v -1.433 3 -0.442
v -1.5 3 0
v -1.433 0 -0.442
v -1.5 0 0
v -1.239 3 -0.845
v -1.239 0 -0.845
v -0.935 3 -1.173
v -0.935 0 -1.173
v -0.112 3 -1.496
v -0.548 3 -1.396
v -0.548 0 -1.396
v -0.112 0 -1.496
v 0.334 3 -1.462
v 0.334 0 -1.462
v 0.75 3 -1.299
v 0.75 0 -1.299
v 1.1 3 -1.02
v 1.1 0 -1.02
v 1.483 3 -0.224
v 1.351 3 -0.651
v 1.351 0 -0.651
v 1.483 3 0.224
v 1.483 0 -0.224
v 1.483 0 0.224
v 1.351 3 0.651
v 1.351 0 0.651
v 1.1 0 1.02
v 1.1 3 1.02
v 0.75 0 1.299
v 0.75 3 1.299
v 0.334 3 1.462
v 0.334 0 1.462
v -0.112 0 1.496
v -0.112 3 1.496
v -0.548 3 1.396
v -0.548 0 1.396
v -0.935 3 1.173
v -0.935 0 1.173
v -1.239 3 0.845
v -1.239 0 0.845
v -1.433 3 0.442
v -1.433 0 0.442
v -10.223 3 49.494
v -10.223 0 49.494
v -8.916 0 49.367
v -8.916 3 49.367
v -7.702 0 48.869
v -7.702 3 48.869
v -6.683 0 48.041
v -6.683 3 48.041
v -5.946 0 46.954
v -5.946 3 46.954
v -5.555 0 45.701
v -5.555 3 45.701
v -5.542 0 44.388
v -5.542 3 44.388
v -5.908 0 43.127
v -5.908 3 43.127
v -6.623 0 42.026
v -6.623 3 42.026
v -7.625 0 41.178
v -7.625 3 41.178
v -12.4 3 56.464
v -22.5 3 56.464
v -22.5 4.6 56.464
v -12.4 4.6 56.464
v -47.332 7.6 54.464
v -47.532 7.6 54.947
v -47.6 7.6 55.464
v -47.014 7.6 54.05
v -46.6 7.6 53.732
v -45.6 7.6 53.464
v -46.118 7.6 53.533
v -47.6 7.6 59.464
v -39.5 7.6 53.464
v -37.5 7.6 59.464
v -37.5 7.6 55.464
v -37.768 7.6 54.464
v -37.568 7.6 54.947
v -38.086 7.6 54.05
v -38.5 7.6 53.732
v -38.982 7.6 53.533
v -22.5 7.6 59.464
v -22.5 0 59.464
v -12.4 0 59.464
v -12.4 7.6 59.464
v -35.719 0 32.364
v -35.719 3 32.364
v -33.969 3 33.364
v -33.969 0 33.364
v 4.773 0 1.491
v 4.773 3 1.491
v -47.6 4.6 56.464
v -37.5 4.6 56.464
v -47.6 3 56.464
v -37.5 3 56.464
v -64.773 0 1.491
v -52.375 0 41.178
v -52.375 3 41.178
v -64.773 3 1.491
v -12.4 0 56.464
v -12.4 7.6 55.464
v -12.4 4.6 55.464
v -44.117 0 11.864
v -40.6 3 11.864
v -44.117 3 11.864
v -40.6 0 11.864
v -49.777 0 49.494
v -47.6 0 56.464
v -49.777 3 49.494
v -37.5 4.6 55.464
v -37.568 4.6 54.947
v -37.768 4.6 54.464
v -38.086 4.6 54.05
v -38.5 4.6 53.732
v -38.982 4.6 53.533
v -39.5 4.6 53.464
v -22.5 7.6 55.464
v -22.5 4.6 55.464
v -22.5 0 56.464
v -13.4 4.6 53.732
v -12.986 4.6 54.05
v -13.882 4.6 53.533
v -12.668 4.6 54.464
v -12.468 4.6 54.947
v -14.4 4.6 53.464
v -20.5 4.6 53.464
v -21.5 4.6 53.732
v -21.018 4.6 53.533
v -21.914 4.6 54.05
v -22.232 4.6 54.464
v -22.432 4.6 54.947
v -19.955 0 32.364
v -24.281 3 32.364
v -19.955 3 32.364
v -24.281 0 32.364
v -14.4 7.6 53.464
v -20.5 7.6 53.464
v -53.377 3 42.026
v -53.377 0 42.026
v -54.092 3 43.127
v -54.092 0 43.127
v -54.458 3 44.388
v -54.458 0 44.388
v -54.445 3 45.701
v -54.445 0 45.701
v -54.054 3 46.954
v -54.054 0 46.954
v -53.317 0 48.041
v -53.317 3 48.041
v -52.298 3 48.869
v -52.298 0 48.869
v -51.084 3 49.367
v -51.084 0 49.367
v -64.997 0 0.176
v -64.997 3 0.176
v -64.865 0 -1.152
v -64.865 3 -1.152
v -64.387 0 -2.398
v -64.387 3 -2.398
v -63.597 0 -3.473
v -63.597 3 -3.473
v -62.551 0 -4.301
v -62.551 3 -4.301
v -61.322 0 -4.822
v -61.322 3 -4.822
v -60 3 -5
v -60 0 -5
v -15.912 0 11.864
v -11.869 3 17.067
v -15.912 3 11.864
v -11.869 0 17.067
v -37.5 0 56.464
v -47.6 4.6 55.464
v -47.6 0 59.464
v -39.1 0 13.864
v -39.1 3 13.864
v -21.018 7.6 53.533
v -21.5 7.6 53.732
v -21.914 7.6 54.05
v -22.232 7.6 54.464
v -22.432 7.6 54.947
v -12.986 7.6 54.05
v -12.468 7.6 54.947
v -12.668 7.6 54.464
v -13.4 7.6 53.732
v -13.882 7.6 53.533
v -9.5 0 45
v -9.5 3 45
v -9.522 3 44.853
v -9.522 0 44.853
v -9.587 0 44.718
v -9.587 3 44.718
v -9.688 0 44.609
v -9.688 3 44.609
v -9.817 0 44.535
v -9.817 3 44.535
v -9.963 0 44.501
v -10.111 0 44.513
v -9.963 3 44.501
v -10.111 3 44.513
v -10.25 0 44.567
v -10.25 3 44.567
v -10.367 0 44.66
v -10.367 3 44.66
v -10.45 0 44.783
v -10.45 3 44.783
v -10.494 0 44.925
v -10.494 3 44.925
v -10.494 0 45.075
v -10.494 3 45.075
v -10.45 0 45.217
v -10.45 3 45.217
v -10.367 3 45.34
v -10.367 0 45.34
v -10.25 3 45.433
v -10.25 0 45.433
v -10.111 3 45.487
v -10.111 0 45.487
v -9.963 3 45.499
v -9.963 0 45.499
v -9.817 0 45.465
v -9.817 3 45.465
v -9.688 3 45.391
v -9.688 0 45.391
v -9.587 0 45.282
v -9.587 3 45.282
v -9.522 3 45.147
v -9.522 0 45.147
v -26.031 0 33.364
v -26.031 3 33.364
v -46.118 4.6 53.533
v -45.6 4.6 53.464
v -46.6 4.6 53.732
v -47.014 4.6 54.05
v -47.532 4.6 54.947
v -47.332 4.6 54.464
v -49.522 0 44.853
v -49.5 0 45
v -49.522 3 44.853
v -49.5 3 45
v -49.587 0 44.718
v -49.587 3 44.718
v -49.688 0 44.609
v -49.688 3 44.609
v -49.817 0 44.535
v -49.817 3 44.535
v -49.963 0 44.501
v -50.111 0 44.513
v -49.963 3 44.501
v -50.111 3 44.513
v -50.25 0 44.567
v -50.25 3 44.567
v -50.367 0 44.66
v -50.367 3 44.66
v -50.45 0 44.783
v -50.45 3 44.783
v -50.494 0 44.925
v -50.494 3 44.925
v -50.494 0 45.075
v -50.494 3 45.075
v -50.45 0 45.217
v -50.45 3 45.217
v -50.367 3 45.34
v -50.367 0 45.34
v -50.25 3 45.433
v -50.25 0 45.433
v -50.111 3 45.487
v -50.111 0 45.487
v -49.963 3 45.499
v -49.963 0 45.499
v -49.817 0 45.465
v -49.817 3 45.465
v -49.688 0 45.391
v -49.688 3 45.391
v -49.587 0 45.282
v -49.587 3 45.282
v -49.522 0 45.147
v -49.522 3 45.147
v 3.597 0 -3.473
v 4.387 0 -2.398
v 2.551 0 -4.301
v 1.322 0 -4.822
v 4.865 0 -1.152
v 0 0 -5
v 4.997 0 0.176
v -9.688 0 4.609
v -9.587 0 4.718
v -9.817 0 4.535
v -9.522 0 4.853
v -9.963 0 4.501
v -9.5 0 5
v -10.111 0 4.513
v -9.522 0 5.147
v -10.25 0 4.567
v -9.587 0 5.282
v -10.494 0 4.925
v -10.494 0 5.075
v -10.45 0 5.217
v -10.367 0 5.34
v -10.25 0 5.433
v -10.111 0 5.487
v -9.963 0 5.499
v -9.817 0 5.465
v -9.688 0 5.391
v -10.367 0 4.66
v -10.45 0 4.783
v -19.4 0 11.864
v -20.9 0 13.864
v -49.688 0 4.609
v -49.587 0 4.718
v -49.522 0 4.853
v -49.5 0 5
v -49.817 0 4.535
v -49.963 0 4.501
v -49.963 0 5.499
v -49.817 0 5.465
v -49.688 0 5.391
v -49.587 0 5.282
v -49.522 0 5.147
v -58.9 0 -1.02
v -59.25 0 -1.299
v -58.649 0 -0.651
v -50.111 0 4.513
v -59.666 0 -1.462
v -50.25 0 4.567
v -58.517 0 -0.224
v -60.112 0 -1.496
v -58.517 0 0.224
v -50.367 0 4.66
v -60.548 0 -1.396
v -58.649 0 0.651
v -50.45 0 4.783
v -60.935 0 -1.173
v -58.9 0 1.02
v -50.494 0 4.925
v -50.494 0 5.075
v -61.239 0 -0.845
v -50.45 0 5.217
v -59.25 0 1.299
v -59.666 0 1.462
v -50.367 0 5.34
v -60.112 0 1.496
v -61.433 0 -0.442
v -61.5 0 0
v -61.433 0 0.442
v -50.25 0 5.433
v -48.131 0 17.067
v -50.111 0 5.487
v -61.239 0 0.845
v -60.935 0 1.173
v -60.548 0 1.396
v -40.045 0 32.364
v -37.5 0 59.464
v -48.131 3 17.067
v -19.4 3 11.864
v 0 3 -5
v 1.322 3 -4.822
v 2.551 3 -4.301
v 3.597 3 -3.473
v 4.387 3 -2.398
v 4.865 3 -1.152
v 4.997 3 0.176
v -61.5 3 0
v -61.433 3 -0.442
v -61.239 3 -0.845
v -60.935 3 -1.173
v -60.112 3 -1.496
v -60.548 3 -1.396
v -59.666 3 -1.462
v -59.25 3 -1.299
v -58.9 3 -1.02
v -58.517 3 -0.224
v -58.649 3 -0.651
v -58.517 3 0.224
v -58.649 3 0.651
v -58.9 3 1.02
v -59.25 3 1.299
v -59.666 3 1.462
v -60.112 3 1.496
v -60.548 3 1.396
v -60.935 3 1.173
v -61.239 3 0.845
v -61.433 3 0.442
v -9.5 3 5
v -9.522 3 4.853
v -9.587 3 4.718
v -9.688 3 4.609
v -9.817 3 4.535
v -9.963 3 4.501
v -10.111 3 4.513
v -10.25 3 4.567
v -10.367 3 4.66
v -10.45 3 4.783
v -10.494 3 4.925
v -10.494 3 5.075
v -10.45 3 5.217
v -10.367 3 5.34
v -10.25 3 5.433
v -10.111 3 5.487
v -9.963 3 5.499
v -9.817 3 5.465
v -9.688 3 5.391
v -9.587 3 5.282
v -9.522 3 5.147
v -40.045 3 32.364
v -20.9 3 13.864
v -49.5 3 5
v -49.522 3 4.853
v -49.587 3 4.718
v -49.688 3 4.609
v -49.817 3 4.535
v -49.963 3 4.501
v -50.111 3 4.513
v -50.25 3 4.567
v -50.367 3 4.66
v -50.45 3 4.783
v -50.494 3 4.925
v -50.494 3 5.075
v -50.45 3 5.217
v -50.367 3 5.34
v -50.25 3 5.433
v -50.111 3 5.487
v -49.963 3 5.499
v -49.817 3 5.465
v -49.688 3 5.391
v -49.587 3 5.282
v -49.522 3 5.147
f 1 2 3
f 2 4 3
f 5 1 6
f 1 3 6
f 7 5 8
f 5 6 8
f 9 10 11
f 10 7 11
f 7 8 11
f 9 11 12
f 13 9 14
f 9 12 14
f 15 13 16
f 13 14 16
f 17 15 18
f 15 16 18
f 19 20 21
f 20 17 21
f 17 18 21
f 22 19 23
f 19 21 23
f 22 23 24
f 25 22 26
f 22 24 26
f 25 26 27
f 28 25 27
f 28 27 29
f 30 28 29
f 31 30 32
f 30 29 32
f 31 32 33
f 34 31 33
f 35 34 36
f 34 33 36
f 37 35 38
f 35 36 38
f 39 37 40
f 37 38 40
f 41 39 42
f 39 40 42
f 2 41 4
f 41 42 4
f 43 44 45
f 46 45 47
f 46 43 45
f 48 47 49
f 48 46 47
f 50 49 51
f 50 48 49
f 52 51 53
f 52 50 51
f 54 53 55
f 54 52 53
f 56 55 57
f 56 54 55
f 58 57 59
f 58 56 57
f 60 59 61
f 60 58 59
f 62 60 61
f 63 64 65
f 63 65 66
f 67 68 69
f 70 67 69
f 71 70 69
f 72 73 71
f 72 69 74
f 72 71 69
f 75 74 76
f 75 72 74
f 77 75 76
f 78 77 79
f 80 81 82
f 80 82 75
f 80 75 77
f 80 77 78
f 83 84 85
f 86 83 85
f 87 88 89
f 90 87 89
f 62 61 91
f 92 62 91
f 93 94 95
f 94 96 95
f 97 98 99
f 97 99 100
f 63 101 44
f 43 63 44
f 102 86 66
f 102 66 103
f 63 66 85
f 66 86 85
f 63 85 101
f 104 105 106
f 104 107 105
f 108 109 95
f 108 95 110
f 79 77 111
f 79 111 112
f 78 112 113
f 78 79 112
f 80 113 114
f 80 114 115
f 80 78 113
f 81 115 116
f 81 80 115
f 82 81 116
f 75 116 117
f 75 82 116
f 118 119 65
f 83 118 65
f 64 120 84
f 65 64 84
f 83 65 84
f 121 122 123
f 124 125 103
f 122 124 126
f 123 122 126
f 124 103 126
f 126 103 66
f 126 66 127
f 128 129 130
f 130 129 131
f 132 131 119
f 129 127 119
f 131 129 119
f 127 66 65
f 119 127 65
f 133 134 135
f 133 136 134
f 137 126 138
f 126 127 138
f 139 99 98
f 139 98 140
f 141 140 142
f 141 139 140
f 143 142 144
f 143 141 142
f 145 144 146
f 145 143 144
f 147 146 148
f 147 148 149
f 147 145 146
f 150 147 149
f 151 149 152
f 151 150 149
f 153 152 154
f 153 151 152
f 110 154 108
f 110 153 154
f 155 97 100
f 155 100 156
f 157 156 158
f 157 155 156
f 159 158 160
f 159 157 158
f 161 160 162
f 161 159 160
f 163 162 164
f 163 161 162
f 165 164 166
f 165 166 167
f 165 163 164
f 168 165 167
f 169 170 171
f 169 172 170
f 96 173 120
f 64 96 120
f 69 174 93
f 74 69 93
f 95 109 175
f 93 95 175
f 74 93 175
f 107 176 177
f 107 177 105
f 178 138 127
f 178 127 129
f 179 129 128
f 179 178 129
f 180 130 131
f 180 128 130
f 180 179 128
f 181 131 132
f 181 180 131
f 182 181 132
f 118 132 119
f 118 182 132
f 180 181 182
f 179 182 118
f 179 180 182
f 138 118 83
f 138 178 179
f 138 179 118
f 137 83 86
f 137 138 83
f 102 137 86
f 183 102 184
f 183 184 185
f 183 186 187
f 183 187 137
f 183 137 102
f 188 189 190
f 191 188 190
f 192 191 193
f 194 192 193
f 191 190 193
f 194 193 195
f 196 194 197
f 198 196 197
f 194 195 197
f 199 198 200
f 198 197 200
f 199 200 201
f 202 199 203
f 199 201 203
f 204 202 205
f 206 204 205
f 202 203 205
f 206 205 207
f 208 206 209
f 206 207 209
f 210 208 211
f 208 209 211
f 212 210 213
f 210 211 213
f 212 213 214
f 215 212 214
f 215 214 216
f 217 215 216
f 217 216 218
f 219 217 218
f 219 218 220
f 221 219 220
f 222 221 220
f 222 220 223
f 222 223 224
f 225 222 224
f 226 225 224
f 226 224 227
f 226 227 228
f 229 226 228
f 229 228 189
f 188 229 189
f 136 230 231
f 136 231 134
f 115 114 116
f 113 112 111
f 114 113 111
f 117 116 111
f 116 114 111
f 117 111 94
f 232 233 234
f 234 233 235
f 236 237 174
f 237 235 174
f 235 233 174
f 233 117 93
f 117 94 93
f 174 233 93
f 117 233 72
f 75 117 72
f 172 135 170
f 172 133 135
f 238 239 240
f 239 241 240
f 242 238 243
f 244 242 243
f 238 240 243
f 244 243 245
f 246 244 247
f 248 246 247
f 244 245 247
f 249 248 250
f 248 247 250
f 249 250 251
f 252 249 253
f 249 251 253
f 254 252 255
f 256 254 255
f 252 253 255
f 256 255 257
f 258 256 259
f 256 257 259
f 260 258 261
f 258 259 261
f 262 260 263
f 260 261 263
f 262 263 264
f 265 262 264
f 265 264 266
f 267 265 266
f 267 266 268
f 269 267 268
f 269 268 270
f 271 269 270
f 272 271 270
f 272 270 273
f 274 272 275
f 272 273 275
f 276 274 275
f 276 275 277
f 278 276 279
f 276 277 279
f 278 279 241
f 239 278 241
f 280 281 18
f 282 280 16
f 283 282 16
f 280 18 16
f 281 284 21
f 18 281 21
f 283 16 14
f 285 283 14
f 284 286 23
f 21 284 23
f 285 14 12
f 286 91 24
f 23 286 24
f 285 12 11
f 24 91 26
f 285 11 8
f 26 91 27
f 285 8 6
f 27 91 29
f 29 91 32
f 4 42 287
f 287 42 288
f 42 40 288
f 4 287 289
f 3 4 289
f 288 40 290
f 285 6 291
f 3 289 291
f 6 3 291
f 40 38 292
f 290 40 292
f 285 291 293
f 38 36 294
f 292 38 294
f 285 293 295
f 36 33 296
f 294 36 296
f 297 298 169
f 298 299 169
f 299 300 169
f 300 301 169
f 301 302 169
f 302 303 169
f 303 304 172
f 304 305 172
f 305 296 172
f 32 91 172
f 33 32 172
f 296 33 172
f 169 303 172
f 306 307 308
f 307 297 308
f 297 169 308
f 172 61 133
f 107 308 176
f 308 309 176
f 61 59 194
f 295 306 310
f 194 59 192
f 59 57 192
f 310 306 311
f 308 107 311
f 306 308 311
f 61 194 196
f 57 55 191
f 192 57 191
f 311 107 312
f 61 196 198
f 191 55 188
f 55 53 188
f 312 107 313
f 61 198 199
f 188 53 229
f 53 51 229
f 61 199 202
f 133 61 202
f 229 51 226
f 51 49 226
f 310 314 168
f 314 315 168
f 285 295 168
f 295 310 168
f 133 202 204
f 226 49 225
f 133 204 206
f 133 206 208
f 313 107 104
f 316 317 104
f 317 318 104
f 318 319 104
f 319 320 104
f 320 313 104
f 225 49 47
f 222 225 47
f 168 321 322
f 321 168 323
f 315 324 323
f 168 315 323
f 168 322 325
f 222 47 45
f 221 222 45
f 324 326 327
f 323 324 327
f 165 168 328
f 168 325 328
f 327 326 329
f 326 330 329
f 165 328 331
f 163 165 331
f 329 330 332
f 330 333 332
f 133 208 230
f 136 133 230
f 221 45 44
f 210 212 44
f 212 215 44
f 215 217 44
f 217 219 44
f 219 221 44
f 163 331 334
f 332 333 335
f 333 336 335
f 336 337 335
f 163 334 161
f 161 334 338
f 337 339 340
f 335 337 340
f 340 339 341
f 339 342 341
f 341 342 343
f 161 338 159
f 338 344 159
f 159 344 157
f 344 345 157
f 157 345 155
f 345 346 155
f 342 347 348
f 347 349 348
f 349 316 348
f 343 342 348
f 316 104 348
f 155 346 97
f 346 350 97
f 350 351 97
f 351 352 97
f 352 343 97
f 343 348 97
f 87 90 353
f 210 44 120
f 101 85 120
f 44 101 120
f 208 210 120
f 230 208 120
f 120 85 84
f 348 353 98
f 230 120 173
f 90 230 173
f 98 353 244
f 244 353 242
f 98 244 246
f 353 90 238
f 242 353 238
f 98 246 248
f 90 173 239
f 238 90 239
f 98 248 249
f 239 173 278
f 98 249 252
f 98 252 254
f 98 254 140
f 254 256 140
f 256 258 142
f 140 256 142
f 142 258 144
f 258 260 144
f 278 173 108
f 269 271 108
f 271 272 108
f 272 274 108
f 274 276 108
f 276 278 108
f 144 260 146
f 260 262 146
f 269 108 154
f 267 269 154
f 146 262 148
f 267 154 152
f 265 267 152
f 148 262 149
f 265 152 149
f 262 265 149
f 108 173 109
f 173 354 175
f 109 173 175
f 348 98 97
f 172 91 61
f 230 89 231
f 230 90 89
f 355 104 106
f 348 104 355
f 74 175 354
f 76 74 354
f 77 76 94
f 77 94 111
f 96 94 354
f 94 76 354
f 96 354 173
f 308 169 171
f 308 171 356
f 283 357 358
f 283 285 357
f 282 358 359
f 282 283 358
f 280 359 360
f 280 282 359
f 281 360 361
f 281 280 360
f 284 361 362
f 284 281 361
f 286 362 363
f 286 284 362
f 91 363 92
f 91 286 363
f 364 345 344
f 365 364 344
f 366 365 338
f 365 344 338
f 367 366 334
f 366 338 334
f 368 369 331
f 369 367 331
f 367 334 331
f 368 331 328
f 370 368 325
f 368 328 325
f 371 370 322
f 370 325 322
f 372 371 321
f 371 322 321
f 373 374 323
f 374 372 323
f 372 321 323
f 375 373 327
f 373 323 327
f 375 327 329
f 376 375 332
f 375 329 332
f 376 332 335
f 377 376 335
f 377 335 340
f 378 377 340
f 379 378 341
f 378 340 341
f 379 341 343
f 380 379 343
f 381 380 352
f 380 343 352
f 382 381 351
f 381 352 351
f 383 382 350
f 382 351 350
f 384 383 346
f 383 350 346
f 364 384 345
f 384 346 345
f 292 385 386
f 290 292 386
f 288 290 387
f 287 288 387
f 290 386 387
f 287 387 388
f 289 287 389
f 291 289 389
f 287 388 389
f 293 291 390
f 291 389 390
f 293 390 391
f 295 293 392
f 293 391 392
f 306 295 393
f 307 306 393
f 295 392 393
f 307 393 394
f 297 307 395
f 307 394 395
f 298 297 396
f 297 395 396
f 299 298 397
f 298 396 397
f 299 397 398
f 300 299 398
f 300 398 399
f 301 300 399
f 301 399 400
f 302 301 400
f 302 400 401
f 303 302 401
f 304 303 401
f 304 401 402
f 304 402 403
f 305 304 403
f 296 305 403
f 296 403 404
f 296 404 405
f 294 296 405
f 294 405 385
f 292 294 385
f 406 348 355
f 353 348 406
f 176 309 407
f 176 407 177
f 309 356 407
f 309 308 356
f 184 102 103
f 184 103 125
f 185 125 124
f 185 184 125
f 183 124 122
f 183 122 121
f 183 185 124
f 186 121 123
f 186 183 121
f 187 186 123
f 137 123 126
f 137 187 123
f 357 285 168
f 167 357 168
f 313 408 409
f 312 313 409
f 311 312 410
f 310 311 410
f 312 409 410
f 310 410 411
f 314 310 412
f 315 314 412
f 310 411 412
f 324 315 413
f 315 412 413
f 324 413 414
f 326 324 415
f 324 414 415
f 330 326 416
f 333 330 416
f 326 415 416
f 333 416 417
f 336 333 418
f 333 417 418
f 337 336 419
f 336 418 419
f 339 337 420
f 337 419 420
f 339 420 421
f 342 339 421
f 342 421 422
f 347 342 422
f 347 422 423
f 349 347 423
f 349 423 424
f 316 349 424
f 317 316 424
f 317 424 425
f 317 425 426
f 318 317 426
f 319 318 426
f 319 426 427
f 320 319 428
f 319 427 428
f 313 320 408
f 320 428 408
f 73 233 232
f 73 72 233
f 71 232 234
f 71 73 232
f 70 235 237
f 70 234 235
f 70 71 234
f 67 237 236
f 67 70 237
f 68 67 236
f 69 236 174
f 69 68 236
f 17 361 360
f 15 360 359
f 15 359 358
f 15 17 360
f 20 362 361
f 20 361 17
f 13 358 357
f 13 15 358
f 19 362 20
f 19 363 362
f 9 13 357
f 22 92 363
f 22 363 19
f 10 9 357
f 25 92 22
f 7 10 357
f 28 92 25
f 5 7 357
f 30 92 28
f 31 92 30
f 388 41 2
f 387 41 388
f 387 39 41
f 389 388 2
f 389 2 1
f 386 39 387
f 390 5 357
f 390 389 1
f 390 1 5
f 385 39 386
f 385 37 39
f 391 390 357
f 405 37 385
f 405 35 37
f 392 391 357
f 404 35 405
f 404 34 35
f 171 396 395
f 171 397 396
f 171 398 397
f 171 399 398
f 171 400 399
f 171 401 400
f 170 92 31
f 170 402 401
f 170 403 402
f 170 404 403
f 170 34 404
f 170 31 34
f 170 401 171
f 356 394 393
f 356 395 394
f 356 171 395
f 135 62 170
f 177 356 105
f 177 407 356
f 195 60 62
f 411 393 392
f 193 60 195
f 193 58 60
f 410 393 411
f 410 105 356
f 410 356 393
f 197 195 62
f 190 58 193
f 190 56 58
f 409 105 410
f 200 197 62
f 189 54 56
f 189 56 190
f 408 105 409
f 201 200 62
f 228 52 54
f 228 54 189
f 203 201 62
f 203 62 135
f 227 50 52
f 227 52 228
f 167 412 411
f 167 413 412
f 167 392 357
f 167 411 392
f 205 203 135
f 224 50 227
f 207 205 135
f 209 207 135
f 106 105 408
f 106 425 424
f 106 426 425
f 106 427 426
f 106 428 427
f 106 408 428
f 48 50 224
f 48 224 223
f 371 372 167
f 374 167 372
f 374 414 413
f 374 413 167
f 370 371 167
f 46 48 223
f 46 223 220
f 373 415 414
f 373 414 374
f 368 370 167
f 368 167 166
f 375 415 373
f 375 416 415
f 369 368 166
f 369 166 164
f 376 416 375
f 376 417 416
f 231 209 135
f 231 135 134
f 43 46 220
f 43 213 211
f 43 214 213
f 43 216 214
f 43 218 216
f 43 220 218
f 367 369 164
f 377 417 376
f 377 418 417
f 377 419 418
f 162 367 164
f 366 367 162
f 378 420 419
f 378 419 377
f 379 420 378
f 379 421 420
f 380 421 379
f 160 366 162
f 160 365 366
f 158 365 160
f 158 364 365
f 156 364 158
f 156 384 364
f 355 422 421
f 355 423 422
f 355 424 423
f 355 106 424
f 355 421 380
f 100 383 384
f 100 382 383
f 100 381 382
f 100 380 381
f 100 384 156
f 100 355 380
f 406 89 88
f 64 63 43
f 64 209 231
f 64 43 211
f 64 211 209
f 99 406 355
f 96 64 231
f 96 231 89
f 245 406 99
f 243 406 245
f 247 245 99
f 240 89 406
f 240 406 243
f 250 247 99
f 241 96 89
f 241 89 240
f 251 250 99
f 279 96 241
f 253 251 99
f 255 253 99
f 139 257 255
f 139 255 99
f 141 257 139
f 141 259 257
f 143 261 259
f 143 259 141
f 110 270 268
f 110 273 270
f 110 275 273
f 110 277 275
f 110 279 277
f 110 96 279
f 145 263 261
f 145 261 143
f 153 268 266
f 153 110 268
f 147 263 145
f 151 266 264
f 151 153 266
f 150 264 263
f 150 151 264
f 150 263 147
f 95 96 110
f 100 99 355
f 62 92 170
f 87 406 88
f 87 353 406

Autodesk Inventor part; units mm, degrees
ref_plane "YZ Plane" through (0, 0, 0) normal (1, 0, 0) x (0, 1, 0)
ref_plane "XZ Plane" through (0, 0, 0) normal (0, 1, 0) x (-1, 0, 0)
sketch "Sketch1" plane through (0, 0, 0) normal (0, 1, 0) x (-1, 0, 0)
  line L0 (12.4, 56.4645) -> (22.5, 56.4645) construction
  circle A0 centre (0, 0) radius 1.5
  line L1 (12.4, 56.4645) -> (0, 0) construction
  circle A1 centre (60, 0) radius 1.5
  line L2 (0, 0) -> (60, 0) construction
  line L3 (47.6, 56.4645) -> (37.5, 56.4645) construction
  line L4 (60, 0) -> (47.6, 56.4645) construction
  line L5 (47.6, 56.4645) -> (37.5, 56.4645) construction
  line L6 (36, 58.4645) -> (24, 58.4645) construction
  line L7 (37.5, 56.4645) -> (36, 58.4645) construction
  line L8 (36, 58.4645) -> (24, 58.4645) construction
  line L9 (24, 58.4645) -> (22.5, 56.4645) construction
  line L10 (22.5, 56.4645) -> (12.4, 56.4645) construction
  line L11 (47.6, 56.4645) -> (47.6, 59.4645)
  line L12 (47.6, 59.4645) -> (37.5, 59.4645)
  line L13 (37.5, 59.4645) -> (37.5, 56.4645)
  line L14 (37.5, 56.4645) -> (22.5, 56.4645)
  line L15 (22.5, 56.4645) -> (22.5, 59.4645)
  line L16 (22.5, 59.4645) -> (12.4, 59.4645)
  line L17 (12.4, 59.4645) -> (12.4, 56.4645)
  circle A2 centre (60, 0) radius 5
  circle A3 centre (0, 0) radius 5
  line L18 (47.6, 56.4645) -> (64.7726, 1.4908)
  line L19 (12.4, 56.4645) -> (-4.7726, 1.4908)
  line L20 (0, -5) -> (60, -5)
  point P0 (17, 90.5)
  dimension "d0" = 3
  dimension "d1" = 10.1
  dimension "d2" = 3
  dimension "d3" = 10.1
  dimension "d4" = 10
  dimension "d5" = 10
  dimension "d6" = 3
  dimension "d7" = 3
extrude "Extrusion1" add sketch "Sketch1" along normal blind 3
sketch "Sketch2" plane through (0, 3, 0) normal (0, 1, 0) x (1, 0, 0)
  line L0 (-47.6, -56.4645) -> (-47.6, -59.4645) projected
  line L1 (-37.5, -59.4645) -> (-37.5, -56.4645) projected
  line L2 (-47.6, -59.4645) -> (-37.5, -59.4645)
  line L3 (-37.5, -59.4645) -> (-37.5, -56.4645)
  line L4 (-37.5, -56.4645) -> (-47.6, -56.4645)
  line L5 (-47.6, -56.4645) -> (-47.6, -59.4645)
  line L6 (-12.4, -59.4645) -> (-12.4, -56.4645) projected
  line L7 (-37.5, -56.4645) -> (-22.5, -56.4645) projected
  line L8 (-12.4, -59.4645) -> (-22.5, -59.4645)
  line L9 (-22.5, -59.4645) -> (-22.5, -56.4645)
  line L10 (-22.5, -56.4645) -> (-12.4, -56.4645)
  line L11 (-12.4, -56.4645) -> (-12.4, -59.4645)
  point P0 (0, 0)
extrude "Extrusion2" add sketch "Sketch2" along normal blind 4.6
ref_plane "Work Plane1" through (-12.4, 3, 56.4645) normal (0, 0, 1) x (0, 1, 0)
sketch "Sketch3" plane through (-12.4, 3, 56.4645) normal (0, 0, 1) x (0, 1, 0)
  line L0 (0, 0) -> (4.6, 0) projected
  line L1 (-3, 10.1) -> (4.6, 10.1) projected
  line L2 (4.6, 0) -> (1.6, 0)
  line L3 (1.6, 0) -> (1.6, 10.1)
  line L4 (1.6, 10.1) -> (4.6, 10.1)
  line L5 (4.6, 10.1) -> (4.6, 0)
  line L6 (-3, 25.1) -> (4.6, 25.1) projected
  line L7 (-3, 35.2) -> (4.6, 35.2) projected
  line L8 (4.6, 25.1) -> (1.6, 25.1)
  line L9 (1.6, 25.1) -> (1.6, 35.2)
  line L10 (1.6, 35.2) -> (4.6, 35.2)
  line L11 (4.6, 35.2) -> (4.6, 25.1)
  point P0 (-3, -12.4)
  point P1 (1.6, 25.1)
  dimension "d12" = 3
  dimension "d13" = 3
extrude "Extrusion3" add sketch "Sketch3" against normal blind 3
fillet "Fillet1" radius 2 4 edges at (-12.4, 6.1, 53.4645) (-22.5, 6.1, 53.4645) (-37.5, 6.1, 53.4645) (-47.6, 6.1, 53.4645)
sketch "Sketch4" plane through (0, 3, 0) normal (0, 1, 0) x (1, 0, 0)
  circle A0 centre (-10, -5) radius 4.5
  line L0 (0, 5) -> (-60, 5) projected
  circle A1 centre (0, 0) radius 1.5 construction
  line L1 (0, 0) -> (0, -9.5) construction
  circle A2 centre (-50, -5) radius 4.5
  circle A3 centre (-10, -45) radius 4.5
  circle A4 centre (-50, -45) radius 4.5
  circle A5 centre (-10, -5) radius 0.5
  circle A6 centre (-50, -5) radius 0.5
  circle A7 centre (-50, -45) radius 0.5
  circle A8 centre (-10, -45) radius 0.5
  dimension "d18" = 9
  dimension "d27" = 60
  dimension "d28" = 10
  dimension "d29" = 10
  dimension "d32" = 40
  dimension "d35" = 40
  dimension "d53" = 1
  dimension "d54" = 1
  dimension "d55" = 1
  dimension "d56" = 1
extrude "Extrusion4" add sketch "Sketch4" against normal blind 3 contours A0 | A2 | A3 | A4 | A5 | A6 | A7 | A8
sketch "Sketch6" plane through (0, 0, 0) normal (0, -1, 0) x (1, 0, 0)
  circle A0 centre (-60, 0) radius 1.55 construction
  line L0 (-44.1169, 11.8645) -> (-48.1306, 17.0674)
  line L1 (-60, 0) -> (-44.1169, 11.8645) construction
  line L2 (-44.1169, 11.8645) -> (-48.1306, 17.0674)
  line L3 (-48.1306, 17.0674) -> (-40.0449, 32.3645)
  line L4 (-48.1306, 17.0674) -> (-40.0449, 32.3645)
  line L5 (-40.0449, 32.3645) -> (-35.7189, 32.3645)
  line L6 (-40.0449, 32.3645) -> (-35.7189, 32.3645)
  line L7 (-33.9689, 33.3645) -> (-26.0311, 33.3645)
  line L8 (-35.7189, 32.3645) -> (-33.9689, 33.3645)
  line L9 (-33.9689, 33.3645) -> (-26.0311, 33.3645)
  line L10 (-24.2811, 32.3645) -> (-19.9551, 32.3645)
  line L11 (-26.0311, 33.3645) -> (-24.2811, 32.3645)
  line L12 (-24.2811, 32.3645) -> (-19.9551, 32.3645)
  line L13 (-19.9551, 32.3645) -> (-11.8694, 17.0674)
  line L14 (-11.8694, 17.0674) -> (-15.9122, 11.8645)
  line L15 (-15.8831, 11.8645) -> (-19.4, 11.8645)
  line L16 (-15.9122, 11.8645) -> (-19.4, 11.8645)
  line L17 (-19.4, 11.8645) -> (-20.9, 13.8645)
  line L18 (-19.4, 11.8645) -> (-20.9, 13.8645)
  line L19 (-20.9, 13.8645) -> (-39.1, 13.8645)
  line L20 (-20.9, 13.8645) -> (-39.1, 13.8645)
  line L21 (-39.1, 13.8645) -> (-40.6, 11.8645)
  line L22 (-39.1, 13.8645) -> (-40.6, 11.8645)
  line L23 (-40.6, 11.8645) -> (-44.1169, 11.8645)
  line L24 (-40.6, 11.8645) -> (-44.1169, 11.8645)
  circle A1 centre (-60, 0) radius 1.5 construction
  point P0 (0, 0)
  point P1 (17, 90.5)
extrude "Extrusion6" cut sketch "Sketch6" against normal up to next
extrude "Extrusion8" cut sketch "Sketch4" against normal up to next contours A5 | A6 | A7 | A8
equation "\"d28\" = -0.5 * d22 + 0.5 * d27"
equation "\"d22\" = 40"
properties part number "ElectronicsMount - ClipOnStyle"
